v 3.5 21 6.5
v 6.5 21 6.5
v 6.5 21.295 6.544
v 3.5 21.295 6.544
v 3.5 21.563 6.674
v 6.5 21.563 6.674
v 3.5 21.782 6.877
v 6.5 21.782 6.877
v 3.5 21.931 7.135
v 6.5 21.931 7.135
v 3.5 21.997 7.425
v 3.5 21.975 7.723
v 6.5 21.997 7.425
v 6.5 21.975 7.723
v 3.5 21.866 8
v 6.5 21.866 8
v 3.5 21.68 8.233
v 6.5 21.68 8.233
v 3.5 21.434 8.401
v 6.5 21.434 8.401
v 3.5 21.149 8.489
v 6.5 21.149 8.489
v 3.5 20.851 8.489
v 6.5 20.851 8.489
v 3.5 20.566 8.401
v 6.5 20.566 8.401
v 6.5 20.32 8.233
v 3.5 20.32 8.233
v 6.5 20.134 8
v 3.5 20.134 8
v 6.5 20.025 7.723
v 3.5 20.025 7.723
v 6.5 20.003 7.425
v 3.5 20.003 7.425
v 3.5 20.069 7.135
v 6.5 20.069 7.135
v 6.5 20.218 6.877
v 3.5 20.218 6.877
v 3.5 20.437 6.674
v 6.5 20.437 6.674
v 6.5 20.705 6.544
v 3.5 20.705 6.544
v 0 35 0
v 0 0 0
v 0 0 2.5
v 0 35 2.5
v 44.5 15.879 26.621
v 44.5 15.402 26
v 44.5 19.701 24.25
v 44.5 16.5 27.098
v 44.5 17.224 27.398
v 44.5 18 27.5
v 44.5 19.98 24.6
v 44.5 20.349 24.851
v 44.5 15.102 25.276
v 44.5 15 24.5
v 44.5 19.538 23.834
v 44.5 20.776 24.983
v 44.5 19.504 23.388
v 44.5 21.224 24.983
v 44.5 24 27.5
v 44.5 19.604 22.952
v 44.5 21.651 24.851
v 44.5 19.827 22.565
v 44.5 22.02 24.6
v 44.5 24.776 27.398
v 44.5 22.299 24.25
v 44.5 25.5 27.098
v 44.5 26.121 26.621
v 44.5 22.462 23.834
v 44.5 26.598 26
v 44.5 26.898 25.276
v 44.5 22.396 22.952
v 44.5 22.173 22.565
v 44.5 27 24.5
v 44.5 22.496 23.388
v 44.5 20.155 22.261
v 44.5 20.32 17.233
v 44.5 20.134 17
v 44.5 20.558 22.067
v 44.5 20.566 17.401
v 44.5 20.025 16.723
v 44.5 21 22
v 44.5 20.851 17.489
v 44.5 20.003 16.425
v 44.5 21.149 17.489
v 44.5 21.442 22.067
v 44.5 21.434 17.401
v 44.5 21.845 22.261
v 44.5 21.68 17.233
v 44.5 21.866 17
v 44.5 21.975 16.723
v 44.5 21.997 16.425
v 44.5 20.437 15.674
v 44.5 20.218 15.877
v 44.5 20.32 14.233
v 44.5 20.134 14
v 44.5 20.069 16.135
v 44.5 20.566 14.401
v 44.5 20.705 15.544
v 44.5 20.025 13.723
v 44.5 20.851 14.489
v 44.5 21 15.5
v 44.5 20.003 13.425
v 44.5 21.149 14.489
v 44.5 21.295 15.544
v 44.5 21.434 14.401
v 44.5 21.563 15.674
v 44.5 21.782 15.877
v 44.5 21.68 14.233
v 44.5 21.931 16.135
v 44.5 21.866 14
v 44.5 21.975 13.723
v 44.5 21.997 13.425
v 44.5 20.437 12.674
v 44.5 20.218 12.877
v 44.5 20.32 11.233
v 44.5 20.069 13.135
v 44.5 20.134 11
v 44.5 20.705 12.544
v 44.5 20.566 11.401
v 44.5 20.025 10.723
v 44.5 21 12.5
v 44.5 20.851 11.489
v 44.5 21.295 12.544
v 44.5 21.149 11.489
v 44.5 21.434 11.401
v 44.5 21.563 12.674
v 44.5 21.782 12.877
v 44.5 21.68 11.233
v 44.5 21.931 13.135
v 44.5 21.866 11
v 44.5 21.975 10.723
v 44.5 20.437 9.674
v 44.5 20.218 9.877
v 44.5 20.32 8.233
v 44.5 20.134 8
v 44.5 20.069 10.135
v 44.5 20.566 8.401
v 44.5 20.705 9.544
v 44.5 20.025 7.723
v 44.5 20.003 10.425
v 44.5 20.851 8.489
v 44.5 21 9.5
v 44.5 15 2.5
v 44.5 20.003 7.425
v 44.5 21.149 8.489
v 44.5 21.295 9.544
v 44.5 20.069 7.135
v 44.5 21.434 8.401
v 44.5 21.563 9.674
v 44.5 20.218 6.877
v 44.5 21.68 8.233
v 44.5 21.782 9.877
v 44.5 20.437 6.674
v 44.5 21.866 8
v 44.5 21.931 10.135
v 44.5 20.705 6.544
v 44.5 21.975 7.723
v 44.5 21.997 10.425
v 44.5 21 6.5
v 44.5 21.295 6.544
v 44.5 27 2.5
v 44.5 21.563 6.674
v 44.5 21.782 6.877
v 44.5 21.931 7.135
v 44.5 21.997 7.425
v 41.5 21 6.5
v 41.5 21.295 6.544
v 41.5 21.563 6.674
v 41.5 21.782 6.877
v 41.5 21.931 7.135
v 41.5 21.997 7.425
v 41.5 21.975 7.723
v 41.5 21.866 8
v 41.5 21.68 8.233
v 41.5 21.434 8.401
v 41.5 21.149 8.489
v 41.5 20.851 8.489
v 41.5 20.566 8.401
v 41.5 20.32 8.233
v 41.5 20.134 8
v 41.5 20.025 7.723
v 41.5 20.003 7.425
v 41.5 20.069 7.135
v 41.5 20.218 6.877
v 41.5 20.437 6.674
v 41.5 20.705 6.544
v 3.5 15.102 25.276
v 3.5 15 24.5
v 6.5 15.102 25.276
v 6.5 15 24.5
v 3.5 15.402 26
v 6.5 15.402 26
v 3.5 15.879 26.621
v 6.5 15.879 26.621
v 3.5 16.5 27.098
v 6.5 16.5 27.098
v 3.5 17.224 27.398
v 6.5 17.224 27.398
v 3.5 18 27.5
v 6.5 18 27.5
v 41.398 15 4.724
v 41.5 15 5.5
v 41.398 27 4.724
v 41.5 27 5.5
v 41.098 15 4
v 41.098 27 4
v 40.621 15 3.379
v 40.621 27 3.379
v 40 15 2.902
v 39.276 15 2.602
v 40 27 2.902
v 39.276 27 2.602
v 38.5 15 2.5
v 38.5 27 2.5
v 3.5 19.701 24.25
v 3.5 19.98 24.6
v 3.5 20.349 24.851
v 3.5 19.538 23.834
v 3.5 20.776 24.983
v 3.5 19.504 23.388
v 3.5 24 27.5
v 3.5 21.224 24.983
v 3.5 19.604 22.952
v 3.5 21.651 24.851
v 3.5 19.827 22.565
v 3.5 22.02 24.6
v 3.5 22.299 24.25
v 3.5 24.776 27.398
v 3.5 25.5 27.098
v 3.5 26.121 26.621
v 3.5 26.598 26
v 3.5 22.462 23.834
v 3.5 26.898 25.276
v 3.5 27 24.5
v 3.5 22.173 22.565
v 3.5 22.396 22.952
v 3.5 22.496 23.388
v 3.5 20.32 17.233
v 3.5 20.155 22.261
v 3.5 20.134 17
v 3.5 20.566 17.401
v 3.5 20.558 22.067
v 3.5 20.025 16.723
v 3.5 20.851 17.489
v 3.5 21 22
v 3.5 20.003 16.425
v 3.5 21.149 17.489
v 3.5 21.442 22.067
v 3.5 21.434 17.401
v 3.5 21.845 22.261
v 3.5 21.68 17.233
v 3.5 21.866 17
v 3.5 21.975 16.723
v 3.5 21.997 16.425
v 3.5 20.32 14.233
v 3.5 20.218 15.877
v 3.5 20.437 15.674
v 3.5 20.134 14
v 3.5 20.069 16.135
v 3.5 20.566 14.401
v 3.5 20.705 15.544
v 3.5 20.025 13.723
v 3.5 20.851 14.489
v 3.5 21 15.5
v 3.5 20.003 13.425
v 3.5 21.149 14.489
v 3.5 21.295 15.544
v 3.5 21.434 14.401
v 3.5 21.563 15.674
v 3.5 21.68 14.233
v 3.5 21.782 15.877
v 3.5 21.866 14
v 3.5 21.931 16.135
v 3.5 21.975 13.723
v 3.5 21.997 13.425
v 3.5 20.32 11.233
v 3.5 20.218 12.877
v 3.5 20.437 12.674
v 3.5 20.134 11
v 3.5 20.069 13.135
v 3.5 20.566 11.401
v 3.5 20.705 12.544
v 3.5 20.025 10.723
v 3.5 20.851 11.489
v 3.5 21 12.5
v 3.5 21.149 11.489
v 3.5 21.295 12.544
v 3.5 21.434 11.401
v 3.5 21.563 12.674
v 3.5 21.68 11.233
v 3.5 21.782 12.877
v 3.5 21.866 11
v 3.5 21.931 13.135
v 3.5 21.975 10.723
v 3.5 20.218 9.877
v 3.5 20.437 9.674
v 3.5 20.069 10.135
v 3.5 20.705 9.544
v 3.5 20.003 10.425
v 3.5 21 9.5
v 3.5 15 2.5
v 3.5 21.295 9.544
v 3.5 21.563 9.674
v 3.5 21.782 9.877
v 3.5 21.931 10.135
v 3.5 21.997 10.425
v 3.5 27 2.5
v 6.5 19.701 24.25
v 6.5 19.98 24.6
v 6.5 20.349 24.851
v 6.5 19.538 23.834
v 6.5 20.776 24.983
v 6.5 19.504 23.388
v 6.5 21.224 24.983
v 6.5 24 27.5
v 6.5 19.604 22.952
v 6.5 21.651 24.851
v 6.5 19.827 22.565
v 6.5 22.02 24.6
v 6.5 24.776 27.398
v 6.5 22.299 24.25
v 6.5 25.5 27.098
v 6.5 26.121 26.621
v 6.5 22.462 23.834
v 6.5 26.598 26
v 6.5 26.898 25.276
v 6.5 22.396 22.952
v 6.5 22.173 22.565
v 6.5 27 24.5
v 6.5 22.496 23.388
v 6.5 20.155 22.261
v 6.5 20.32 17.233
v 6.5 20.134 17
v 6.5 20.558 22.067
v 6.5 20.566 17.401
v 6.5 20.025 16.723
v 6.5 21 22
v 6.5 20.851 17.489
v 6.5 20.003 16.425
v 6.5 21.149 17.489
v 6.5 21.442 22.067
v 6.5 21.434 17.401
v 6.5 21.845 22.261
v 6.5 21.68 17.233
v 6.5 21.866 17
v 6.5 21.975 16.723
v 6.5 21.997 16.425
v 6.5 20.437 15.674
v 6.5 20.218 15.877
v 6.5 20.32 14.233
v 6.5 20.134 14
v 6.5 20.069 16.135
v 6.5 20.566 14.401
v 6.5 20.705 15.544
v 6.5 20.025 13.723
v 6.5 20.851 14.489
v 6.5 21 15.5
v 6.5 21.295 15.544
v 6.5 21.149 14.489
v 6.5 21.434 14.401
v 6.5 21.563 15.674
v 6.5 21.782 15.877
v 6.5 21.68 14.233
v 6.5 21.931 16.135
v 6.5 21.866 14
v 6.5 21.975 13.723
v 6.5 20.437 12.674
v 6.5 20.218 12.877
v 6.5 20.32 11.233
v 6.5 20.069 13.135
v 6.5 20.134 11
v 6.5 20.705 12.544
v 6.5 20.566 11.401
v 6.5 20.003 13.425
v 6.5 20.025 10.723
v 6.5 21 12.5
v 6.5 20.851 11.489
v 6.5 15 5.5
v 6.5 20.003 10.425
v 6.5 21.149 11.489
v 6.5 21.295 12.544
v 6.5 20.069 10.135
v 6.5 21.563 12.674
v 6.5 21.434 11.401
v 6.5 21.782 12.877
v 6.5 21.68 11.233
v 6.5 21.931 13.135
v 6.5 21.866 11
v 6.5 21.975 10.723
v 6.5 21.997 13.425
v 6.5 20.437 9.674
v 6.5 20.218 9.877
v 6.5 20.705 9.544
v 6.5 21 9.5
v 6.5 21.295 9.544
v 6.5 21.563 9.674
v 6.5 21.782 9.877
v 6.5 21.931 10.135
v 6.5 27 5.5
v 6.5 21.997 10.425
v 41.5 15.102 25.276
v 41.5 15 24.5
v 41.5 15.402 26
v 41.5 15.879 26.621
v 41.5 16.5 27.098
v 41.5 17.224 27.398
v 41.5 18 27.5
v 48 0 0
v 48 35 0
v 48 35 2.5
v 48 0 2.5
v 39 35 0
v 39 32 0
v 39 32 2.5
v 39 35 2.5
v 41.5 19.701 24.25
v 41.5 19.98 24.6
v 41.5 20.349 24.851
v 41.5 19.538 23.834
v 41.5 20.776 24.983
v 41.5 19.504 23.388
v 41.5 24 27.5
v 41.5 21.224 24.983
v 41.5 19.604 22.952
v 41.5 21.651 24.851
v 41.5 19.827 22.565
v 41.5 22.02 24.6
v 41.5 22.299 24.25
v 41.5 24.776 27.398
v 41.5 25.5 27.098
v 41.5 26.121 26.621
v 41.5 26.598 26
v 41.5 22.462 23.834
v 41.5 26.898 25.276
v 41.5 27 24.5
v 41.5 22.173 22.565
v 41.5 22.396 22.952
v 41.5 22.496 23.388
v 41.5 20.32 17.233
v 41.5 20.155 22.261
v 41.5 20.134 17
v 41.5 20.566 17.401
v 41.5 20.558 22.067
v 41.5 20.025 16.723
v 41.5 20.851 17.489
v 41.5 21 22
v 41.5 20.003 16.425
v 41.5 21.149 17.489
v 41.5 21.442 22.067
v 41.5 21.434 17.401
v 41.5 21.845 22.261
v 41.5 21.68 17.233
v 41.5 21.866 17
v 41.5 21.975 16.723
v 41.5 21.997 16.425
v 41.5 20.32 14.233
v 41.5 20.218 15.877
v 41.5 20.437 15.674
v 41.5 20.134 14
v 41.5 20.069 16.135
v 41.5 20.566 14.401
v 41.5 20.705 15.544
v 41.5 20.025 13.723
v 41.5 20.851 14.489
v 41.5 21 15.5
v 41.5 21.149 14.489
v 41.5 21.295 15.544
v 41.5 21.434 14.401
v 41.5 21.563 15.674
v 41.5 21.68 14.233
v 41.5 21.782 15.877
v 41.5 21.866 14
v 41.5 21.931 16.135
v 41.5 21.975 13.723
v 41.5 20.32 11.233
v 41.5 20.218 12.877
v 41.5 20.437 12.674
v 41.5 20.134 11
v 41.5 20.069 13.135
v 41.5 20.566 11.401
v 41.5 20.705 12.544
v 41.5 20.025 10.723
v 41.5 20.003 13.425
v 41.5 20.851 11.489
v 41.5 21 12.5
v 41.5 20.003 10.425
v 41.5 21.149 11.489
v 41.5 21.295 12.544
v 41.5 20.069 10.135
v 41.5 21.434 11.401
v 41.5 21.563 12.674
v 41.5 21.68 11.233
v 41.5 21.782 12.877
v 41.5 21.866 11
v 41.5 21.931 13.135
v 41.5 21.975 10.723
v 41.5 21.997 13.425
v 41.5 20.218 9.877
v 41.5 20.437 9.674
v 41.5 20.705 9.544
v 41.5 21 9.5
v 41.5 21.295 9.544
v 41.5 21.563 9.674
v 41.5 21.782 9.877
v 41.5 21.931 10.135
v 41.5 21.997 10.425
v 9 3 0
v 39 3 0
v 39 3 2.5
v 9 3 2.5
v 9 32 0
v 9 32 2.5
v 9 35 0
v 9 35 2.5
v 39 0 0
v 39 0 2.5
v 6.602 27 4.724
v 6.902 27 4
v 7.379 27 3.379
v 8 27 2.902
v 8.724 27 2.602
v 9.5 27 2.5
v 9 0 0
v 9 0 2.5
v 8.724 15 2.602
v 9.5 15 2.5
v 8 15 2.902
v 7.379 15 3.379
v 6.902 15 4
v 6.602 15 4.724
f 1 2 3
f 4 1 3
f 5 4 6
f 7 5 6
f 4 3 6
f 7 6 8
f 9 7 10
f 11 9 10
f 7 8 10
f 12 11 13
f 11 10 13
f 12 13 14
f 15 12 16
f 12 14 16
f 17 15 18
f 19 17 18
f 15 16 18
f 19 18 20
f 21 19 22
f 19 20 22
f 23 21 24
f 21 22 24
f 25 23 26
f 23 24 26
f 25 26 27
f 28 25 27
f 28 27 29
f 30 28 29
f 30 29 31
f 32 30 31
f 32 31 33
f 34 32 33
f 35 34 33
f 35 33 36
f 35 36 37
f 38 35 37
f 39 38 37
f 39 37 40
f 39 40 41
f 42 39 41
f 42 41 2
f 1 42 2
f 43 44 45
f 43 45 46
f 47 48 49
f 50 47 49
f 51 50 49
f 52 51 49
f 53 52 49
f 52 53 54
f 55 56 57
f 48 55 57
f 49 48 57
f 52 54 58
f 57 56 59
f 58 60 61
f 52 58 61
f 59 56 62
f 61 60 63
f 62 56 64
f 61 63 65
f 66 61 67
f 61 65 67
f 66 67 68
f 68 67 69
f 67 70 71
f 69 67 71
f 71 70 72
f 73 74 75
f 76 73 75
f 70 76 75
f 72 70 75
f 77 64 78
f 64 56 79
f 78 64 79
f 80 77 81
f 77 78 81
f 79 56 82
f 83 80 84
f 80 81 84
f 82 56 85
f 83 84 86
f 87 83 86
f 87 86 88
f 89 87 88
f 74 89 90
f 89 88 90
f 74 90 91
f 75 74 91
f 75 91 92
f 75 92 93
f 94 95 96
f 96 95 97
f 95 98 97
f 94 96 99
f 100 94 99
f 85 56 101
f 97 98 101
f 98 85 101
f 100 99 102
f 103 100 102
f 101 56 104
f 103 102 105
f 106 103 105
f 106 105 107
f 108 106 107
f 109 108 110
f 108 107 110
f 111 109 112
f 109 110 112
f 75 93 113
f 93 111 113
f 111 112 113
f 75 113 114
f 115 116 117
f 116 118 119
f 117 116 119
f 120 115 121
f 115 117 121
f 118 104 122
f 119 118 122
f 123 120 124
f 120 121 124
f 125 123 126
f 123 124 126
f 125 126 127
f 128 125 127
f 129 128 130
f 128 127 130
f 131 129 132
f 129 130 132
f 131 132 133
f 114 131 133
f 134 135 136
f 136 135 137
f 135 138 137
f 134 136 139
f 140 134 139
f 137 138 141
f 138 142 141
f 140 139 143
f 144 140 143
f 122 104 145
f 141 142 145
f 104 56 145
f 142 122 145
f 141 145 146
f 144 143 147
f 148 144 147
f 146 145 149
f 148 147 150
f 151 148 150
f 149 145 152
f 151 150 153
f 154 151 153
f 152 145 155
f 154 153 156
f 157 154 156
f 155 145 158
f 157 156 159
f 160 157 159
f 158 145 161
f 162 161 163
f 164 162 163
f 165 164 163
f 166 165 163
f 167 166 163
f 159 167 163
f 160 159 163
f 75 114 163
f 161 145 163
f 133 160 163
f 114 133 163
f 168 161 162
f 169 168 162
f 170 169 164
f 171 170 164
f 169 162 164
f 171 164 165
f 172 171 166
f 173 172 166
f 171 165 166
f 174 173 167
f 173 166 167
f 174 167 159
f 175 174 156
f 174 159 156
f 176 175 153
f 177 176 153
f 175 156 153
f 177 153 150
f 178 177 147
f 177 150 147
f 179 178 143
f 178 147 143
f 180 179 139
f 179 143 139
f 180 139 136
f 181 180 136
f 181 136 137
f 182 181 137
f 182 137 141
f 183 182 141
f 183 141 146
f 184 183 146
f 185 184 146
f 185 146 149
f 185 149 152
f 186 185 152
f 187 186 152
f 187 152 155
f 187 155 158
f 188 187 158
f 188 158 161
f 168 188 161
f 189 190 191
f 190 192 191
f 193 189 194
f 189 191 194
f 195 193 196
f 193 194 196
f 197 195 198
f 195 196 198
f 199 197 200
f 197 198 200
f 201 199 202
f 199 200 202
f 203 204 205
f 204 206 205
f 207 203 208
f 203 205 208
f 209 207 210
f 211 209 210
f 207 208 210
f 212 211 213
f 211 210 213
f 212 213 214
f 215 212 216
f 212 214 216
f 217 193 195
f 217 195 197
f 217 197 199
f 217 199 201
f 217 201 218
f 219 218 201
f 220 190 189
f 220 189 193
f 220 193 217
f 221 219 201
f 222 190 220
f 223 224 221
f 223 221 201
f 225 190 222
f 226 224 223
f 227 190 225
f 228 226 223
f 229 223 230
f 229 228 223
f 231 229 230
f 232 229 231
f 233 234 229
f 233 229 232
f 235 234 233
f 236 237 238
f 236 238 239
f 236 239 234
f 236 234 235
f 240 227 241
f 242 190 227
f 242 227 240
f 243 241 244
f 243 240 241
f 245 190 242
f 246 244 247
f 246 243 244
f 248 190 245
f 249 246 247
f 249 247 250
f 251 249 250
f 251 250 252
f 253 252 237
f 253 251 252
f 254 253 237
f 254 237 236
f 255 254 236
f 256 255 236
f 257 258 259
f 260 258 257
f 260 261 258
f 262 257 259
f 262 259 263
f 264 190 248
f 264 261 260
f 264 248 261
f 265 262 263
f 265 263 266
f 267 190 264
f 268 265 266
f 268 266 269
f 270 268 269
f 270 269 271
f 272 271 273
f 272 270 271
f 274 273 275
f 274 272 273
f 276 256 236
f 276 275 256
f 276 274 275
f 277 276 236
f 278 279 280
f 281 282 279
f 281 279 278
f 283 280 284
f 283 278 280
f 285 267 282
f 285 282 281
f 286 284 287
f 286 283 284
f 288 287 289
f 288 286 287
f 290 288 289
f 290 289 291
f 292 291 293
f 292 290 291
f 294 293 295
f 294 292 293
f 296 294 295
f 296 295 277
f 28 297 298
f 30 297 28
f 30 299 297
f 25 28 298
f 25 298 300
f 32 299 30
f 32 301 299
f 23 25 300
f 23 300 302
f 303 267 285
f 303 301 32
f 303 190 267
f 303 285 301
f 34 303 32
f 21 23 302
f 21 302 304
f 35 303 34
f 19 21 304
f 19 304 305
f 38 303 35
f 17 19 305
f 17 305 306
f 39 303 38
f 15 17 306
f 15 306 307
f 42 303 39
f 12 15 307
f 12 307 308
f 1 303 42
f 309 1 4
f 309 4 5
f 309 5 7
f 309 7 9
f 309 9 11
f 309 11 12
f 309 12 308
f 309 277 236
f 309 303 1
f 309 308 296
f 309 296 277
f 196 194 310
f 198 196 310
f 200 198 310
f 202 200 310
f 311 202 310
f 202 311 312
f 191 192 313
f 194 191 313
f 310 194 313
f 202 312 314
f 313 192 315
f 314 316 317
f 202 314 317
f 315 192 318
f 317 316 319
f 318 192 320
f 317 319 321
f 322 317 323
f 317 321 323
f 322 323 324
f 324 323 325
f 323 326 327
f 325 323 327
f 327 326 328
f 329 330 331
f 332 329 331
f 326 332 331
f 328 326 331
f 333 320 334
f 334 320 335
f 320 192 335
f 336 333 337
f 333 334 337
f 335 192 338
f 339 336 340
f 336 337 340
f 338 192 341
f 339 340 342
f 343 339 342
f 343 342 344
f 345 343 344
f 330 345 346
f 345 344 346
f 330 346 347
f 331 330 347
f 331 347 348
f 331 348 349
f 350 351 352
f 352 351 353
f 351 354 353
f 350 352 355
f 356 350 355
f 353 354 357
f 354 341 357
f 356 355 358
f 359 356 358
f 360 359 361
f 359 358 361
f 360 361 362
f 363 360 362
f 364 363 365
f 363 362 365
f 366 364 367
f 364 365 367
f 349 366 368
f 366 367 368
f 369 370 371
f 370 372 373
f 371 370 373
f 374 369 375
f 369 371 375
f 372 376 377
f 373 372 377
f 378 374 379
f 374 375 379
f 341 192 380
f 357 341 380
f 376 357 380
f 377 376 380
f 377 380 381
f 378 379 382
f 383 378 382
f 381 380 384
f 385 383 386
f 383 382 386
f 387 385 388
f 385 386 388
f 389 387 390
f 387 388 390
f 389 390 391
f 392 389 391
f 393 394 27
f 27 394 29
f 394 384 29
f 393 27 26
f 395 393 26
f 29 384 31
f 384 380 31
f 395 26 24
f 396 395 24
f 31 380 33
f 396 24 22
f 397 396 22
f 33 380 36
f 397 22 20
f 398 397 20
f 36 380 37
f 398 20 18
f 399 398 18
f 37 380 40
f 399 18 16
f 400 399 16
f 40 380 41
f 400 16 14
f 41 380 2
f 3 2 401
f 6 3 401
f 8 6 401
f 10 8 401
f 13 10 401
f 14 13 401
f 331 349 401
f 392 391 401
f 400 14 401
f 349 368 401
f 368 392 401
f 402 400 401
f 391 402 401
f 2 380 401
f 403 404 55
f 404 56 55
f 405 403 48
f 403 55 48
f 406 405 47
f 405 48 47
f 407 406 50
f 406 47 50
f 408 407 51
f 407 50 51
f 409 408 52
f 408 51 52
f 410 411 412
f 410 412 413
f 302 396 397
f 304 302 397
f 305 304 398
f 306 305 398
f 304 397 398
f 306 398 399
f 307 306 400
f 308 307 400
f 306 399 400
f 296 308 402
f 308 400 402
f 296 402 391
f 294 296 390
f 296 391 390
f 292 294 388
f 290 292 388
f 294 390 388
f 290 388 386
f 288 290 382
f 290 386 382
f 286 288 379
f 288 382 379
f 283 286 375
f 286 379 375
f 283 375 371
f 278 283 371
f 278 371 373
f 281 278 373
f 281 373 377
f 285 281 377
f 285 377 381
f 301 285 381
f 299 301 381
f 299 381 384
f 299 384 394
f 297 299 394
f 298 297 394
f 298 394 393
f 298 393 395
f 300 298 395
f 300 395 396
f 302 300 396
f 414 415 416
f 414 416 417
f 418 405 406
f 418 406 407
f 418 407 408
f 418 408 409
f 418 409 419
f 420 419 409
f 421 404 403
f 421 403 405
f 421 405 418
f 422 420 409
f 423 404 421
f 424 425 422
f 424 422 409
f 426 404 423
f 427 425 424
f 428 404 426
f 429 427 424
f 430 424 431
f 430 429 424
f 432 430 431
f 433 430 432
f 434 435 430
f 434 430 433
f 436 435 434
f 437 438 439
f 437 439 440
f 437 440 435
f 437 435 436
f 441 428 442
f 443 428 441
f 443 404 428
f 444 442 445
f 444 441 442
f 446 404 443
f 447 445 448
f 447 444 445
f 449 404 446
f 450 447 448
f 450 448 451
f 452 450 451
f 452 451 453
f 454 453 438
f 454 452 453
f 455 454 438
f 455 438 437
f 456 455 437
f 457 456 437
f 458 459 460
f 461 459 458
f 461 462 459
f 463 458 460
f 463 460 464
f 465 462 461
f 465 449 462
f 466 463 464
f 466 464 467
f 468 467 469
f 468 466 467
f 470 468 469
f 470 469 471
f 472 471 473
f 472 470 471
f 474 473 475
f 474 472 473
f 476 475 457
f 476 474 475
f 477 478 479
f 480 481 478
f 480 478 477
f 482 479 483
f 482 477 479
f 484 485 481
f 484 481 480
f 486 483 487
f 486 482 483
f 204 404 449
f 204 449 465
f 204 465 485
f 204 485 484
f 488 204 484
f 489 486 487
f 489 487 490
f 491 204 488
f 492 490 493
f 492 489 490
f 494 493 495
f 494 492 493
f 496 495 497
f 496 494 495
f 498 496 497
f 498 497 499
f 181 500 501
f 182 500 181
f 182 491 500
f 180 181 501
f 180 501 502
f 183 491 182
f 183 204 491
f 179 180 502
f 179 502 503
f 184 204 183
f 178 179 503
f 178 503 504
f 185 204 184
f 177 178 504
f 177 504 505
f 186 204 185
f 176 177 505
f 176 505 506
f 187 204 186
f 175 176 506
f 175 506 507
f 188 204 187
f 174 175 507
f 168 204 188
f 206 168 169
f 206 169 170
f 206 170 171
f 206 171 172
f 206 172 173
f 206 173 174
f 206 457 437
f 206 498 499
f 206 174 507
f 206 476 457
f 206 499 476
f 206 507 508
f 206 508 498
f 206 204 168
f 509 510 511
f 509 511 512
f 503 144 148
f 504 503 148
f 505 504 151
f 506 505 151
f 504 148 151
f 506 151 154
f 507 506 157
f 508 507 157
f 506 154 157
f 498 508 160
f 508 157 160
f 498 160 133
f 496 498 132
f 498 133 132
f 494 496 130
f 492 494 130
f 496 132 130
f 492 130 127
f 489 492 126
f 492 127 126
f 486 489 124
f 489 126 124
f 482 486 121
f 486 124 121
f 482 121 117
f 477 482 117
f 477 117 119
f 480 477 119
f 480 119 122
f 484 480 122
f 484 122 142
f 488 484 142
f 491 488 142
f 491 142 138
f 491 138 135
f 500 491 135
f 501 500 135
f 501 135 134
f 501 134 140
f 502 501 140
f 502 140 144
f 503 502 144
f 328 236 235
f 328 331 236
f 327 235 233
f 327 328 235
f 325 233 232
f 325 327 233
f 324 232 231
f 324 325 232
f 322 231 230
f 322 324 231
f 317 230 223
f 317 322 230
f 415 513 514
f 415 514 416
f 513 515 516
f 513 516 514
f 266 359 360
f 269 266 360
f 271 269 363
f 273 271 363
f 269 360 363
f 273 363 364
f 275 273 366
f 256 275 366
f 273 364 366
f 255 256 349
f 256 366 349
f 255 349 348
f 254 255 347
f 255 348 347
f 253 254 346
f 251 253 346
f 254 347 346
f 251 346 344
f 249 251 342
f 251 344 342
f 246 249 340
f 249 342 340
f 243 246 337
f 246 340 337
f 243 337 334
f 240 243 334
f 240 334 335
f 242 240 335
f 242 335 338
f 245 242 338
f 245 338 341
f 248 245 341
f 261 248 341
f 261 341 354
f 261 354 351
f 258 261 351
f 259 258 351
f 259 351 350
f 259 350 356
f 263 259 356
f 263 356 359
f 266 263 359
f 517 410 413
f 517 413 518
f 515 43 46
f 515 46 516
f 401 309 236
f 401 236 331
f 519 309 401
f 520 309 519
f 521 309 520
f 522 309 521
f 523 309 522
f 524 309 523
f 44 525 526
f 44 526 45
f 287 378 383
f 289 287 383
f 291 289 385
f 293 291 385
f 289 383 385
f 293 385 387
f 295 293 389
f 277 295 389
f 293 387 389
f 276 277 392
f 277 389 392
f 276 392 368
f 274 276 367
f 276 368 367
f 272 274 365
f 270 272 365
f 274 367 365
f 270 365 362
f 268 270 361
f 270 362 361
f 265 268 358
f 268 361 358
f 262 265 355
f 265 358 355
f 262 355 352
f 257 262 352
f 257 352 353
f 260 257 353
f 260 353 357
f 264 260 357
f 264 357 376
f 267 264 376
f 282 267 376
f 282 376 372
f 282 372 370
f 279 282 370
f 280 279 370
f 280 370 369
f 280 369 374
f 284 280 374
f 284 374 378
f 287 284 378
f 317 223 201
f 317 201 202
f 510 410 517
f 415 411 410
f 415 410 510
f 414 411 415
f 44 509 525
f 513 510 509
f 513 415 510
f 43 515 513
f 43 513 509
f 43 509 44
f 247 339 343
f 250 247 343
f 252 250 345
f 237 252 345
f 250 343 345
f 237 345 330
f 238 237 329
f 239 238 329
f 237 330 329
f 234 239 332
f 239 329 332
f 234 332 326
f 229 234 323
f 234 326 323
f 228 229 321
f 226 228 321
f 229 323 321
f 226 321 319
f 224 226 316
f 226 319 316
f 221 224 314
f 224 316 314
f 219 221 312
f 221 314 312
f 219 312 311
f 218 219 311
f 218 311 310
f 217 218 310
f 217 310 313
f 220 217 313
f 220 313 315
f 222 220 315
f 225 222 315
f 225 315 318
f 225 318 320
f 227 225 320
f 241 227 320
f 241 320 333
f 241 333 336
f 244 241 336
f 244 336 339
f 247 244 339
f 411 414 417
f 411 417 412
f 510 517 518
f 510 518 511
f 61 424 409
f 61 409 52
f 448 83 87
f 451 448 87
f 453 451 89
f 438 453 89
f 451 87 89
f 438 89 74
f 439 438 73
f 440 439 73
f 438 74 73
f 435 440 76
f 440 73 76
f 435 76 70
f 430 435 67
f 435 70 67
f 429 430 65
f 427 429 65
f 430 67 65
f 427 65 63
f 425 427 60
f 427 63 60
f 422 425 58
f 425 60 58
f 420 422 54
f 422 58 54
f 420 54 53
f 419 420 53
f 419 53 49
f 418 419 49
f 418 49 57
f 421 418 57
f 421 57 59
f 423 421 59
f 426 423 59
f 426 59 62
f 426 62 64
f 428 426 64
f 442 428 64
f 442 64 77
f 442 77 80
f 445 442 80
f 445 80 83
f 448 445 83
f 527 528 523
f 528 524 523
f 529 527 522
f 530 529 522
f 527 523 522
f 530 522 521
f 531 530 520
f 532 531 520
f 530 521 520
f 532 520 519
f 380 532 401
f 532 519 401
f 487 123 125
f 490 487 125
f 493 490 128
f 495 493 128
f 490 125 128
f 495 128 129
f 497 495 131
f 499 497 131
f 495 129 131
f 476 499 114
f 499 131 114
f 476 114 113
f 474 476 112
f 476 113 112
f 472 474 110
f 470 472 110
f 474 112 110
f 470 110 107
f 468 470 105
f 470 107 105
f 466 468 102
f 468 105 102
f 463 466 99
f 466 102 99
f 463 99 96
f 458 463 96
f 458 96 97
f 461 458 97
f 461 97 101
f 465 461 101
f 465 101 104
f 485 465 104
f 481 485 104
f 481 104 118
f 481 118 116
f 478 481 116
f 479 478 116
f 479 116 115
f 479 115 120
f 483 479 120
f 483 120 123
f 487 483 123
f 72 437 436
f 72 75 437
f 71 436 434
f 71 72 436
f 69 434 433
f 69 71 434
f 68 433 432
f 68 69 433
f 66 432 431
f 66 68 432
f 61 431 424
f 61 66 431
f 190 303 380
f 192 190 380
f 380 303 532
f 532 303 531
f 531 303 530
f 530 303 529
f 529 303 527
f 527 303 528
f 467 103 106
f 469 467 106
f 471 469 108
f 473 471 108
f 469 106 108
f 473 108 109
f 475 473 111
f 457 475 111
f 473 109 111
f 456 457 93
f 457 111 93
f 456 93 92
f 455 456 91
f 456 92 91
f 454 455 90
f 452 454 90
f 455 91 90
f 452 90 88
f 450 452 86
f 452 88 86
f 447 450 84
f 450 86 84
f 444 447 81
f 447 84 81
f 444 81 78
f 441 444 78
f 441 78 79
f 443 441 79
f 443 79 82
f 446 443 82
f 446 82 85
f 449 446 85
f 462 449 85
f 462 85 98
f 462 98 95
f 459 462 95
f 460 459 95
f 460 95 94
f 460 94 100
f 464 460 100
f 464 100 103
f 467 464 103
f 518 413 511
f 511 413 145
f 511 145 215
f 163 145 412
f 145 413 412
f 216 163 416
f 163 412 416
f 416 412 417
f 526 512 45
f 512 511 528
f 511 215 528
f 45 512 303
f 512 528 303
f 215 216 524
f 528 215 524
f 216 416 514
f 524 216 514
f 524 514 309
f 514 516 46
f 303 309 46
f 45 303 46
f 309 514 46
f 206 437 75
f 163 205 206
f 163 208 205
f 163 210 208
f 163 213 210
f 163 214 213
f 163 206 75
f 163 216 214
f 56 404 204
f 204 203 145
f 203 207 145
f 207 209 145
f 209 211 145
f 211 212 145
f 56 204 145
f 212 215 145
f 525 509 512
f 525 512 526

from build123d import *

# Parameters (mm, degrees)
BOSS_EXTRU_1_DEPTH      = 2.5
ESQUISSE2_W             = 3
ESQUISSE2_H             = 12
BOSS_EXTRU_2_DEPTH      = 25
ESQUISSE3_R             = 1
ESQUISSE3_R_2           = 1.5
ENL_V_MAT_EXTRU_1_DEPTH = 50
CONG_1_R                = 3
CONG_2_R                = 3


with BuildPart() as part:
    # Esquisse1 → Boss.-Extru.1 (new body)
    with BuildSketch(Plane.XY):
        Polygon((39, 35), (48, 35), (48, 0), (39, 0), (39, 3), (9, 3), (9, 0), (0, 0), (0, 35), (9, 35), (9, 32), (39, 32), align=None)
    extrude(amount=BOSS_EXTRU_1_DEPTH)

    # Esquisse2 → Boss.-Extru.2 (add)
    with BuildSketch(Plane.XY.offset(2.5)):
        with Locations((5, 21)):
            Rectangle(ESQUISSE2_W, ESQUISSE2_H)
        with Locations((43, 21)):
            Rectangle(ESQUISSE2_W, ESQUISSE2_H)
    extrude(amount=BOSS_EXTRU_2_DEPTH)

    # Esquisse3 → Enlèv. mat.-Extru.1 (cut)
    with BuildSketch(Plane(origin=(44.5, 0, 0), x_dir=(0, 0, -1), z_dir=(1, 0, 0))):
        with Locations((-7.5, 21)):
            Circle(ESQUISSE3_R)
        with Locations((-10.5, 21)):
            Circle(ESQUISSE3_R)
        with Locations((-13.5, 21)):
            Circle(ESQUISSE3_R)
        with Locations((-16.5, 21)):
            Circle(ESQUISSE3_R)
        with Locations((-23.5, 21)):
            Circle(ESQUISSE3_R_2)
    extrude(amount=-ENL_V_MAT_EXTRU_1_DEPTH, mode=Mode.SUBTRACT)

    # Congé1
    cong_1_edges = [part.edges().sort_by_distance(p)[0] for p in [
        (5, 15, 27.5),
        (5, 27, 27.5),
        (43, 15, 27.5),
        (43, 27, 27.5),
    ]]
    fillet(cong_1_edges, radius=CONG_1_R)

    # Congé2
    cong_2_edges = [part.edges().sort_by_distance(p)[0] for p in [
        (6.5, 21, 2.5),
        (41.5, 21, 2.5),
    ]]
    fillet(cong_2_edges, radius=CONG_2_R)


solid = part.part
